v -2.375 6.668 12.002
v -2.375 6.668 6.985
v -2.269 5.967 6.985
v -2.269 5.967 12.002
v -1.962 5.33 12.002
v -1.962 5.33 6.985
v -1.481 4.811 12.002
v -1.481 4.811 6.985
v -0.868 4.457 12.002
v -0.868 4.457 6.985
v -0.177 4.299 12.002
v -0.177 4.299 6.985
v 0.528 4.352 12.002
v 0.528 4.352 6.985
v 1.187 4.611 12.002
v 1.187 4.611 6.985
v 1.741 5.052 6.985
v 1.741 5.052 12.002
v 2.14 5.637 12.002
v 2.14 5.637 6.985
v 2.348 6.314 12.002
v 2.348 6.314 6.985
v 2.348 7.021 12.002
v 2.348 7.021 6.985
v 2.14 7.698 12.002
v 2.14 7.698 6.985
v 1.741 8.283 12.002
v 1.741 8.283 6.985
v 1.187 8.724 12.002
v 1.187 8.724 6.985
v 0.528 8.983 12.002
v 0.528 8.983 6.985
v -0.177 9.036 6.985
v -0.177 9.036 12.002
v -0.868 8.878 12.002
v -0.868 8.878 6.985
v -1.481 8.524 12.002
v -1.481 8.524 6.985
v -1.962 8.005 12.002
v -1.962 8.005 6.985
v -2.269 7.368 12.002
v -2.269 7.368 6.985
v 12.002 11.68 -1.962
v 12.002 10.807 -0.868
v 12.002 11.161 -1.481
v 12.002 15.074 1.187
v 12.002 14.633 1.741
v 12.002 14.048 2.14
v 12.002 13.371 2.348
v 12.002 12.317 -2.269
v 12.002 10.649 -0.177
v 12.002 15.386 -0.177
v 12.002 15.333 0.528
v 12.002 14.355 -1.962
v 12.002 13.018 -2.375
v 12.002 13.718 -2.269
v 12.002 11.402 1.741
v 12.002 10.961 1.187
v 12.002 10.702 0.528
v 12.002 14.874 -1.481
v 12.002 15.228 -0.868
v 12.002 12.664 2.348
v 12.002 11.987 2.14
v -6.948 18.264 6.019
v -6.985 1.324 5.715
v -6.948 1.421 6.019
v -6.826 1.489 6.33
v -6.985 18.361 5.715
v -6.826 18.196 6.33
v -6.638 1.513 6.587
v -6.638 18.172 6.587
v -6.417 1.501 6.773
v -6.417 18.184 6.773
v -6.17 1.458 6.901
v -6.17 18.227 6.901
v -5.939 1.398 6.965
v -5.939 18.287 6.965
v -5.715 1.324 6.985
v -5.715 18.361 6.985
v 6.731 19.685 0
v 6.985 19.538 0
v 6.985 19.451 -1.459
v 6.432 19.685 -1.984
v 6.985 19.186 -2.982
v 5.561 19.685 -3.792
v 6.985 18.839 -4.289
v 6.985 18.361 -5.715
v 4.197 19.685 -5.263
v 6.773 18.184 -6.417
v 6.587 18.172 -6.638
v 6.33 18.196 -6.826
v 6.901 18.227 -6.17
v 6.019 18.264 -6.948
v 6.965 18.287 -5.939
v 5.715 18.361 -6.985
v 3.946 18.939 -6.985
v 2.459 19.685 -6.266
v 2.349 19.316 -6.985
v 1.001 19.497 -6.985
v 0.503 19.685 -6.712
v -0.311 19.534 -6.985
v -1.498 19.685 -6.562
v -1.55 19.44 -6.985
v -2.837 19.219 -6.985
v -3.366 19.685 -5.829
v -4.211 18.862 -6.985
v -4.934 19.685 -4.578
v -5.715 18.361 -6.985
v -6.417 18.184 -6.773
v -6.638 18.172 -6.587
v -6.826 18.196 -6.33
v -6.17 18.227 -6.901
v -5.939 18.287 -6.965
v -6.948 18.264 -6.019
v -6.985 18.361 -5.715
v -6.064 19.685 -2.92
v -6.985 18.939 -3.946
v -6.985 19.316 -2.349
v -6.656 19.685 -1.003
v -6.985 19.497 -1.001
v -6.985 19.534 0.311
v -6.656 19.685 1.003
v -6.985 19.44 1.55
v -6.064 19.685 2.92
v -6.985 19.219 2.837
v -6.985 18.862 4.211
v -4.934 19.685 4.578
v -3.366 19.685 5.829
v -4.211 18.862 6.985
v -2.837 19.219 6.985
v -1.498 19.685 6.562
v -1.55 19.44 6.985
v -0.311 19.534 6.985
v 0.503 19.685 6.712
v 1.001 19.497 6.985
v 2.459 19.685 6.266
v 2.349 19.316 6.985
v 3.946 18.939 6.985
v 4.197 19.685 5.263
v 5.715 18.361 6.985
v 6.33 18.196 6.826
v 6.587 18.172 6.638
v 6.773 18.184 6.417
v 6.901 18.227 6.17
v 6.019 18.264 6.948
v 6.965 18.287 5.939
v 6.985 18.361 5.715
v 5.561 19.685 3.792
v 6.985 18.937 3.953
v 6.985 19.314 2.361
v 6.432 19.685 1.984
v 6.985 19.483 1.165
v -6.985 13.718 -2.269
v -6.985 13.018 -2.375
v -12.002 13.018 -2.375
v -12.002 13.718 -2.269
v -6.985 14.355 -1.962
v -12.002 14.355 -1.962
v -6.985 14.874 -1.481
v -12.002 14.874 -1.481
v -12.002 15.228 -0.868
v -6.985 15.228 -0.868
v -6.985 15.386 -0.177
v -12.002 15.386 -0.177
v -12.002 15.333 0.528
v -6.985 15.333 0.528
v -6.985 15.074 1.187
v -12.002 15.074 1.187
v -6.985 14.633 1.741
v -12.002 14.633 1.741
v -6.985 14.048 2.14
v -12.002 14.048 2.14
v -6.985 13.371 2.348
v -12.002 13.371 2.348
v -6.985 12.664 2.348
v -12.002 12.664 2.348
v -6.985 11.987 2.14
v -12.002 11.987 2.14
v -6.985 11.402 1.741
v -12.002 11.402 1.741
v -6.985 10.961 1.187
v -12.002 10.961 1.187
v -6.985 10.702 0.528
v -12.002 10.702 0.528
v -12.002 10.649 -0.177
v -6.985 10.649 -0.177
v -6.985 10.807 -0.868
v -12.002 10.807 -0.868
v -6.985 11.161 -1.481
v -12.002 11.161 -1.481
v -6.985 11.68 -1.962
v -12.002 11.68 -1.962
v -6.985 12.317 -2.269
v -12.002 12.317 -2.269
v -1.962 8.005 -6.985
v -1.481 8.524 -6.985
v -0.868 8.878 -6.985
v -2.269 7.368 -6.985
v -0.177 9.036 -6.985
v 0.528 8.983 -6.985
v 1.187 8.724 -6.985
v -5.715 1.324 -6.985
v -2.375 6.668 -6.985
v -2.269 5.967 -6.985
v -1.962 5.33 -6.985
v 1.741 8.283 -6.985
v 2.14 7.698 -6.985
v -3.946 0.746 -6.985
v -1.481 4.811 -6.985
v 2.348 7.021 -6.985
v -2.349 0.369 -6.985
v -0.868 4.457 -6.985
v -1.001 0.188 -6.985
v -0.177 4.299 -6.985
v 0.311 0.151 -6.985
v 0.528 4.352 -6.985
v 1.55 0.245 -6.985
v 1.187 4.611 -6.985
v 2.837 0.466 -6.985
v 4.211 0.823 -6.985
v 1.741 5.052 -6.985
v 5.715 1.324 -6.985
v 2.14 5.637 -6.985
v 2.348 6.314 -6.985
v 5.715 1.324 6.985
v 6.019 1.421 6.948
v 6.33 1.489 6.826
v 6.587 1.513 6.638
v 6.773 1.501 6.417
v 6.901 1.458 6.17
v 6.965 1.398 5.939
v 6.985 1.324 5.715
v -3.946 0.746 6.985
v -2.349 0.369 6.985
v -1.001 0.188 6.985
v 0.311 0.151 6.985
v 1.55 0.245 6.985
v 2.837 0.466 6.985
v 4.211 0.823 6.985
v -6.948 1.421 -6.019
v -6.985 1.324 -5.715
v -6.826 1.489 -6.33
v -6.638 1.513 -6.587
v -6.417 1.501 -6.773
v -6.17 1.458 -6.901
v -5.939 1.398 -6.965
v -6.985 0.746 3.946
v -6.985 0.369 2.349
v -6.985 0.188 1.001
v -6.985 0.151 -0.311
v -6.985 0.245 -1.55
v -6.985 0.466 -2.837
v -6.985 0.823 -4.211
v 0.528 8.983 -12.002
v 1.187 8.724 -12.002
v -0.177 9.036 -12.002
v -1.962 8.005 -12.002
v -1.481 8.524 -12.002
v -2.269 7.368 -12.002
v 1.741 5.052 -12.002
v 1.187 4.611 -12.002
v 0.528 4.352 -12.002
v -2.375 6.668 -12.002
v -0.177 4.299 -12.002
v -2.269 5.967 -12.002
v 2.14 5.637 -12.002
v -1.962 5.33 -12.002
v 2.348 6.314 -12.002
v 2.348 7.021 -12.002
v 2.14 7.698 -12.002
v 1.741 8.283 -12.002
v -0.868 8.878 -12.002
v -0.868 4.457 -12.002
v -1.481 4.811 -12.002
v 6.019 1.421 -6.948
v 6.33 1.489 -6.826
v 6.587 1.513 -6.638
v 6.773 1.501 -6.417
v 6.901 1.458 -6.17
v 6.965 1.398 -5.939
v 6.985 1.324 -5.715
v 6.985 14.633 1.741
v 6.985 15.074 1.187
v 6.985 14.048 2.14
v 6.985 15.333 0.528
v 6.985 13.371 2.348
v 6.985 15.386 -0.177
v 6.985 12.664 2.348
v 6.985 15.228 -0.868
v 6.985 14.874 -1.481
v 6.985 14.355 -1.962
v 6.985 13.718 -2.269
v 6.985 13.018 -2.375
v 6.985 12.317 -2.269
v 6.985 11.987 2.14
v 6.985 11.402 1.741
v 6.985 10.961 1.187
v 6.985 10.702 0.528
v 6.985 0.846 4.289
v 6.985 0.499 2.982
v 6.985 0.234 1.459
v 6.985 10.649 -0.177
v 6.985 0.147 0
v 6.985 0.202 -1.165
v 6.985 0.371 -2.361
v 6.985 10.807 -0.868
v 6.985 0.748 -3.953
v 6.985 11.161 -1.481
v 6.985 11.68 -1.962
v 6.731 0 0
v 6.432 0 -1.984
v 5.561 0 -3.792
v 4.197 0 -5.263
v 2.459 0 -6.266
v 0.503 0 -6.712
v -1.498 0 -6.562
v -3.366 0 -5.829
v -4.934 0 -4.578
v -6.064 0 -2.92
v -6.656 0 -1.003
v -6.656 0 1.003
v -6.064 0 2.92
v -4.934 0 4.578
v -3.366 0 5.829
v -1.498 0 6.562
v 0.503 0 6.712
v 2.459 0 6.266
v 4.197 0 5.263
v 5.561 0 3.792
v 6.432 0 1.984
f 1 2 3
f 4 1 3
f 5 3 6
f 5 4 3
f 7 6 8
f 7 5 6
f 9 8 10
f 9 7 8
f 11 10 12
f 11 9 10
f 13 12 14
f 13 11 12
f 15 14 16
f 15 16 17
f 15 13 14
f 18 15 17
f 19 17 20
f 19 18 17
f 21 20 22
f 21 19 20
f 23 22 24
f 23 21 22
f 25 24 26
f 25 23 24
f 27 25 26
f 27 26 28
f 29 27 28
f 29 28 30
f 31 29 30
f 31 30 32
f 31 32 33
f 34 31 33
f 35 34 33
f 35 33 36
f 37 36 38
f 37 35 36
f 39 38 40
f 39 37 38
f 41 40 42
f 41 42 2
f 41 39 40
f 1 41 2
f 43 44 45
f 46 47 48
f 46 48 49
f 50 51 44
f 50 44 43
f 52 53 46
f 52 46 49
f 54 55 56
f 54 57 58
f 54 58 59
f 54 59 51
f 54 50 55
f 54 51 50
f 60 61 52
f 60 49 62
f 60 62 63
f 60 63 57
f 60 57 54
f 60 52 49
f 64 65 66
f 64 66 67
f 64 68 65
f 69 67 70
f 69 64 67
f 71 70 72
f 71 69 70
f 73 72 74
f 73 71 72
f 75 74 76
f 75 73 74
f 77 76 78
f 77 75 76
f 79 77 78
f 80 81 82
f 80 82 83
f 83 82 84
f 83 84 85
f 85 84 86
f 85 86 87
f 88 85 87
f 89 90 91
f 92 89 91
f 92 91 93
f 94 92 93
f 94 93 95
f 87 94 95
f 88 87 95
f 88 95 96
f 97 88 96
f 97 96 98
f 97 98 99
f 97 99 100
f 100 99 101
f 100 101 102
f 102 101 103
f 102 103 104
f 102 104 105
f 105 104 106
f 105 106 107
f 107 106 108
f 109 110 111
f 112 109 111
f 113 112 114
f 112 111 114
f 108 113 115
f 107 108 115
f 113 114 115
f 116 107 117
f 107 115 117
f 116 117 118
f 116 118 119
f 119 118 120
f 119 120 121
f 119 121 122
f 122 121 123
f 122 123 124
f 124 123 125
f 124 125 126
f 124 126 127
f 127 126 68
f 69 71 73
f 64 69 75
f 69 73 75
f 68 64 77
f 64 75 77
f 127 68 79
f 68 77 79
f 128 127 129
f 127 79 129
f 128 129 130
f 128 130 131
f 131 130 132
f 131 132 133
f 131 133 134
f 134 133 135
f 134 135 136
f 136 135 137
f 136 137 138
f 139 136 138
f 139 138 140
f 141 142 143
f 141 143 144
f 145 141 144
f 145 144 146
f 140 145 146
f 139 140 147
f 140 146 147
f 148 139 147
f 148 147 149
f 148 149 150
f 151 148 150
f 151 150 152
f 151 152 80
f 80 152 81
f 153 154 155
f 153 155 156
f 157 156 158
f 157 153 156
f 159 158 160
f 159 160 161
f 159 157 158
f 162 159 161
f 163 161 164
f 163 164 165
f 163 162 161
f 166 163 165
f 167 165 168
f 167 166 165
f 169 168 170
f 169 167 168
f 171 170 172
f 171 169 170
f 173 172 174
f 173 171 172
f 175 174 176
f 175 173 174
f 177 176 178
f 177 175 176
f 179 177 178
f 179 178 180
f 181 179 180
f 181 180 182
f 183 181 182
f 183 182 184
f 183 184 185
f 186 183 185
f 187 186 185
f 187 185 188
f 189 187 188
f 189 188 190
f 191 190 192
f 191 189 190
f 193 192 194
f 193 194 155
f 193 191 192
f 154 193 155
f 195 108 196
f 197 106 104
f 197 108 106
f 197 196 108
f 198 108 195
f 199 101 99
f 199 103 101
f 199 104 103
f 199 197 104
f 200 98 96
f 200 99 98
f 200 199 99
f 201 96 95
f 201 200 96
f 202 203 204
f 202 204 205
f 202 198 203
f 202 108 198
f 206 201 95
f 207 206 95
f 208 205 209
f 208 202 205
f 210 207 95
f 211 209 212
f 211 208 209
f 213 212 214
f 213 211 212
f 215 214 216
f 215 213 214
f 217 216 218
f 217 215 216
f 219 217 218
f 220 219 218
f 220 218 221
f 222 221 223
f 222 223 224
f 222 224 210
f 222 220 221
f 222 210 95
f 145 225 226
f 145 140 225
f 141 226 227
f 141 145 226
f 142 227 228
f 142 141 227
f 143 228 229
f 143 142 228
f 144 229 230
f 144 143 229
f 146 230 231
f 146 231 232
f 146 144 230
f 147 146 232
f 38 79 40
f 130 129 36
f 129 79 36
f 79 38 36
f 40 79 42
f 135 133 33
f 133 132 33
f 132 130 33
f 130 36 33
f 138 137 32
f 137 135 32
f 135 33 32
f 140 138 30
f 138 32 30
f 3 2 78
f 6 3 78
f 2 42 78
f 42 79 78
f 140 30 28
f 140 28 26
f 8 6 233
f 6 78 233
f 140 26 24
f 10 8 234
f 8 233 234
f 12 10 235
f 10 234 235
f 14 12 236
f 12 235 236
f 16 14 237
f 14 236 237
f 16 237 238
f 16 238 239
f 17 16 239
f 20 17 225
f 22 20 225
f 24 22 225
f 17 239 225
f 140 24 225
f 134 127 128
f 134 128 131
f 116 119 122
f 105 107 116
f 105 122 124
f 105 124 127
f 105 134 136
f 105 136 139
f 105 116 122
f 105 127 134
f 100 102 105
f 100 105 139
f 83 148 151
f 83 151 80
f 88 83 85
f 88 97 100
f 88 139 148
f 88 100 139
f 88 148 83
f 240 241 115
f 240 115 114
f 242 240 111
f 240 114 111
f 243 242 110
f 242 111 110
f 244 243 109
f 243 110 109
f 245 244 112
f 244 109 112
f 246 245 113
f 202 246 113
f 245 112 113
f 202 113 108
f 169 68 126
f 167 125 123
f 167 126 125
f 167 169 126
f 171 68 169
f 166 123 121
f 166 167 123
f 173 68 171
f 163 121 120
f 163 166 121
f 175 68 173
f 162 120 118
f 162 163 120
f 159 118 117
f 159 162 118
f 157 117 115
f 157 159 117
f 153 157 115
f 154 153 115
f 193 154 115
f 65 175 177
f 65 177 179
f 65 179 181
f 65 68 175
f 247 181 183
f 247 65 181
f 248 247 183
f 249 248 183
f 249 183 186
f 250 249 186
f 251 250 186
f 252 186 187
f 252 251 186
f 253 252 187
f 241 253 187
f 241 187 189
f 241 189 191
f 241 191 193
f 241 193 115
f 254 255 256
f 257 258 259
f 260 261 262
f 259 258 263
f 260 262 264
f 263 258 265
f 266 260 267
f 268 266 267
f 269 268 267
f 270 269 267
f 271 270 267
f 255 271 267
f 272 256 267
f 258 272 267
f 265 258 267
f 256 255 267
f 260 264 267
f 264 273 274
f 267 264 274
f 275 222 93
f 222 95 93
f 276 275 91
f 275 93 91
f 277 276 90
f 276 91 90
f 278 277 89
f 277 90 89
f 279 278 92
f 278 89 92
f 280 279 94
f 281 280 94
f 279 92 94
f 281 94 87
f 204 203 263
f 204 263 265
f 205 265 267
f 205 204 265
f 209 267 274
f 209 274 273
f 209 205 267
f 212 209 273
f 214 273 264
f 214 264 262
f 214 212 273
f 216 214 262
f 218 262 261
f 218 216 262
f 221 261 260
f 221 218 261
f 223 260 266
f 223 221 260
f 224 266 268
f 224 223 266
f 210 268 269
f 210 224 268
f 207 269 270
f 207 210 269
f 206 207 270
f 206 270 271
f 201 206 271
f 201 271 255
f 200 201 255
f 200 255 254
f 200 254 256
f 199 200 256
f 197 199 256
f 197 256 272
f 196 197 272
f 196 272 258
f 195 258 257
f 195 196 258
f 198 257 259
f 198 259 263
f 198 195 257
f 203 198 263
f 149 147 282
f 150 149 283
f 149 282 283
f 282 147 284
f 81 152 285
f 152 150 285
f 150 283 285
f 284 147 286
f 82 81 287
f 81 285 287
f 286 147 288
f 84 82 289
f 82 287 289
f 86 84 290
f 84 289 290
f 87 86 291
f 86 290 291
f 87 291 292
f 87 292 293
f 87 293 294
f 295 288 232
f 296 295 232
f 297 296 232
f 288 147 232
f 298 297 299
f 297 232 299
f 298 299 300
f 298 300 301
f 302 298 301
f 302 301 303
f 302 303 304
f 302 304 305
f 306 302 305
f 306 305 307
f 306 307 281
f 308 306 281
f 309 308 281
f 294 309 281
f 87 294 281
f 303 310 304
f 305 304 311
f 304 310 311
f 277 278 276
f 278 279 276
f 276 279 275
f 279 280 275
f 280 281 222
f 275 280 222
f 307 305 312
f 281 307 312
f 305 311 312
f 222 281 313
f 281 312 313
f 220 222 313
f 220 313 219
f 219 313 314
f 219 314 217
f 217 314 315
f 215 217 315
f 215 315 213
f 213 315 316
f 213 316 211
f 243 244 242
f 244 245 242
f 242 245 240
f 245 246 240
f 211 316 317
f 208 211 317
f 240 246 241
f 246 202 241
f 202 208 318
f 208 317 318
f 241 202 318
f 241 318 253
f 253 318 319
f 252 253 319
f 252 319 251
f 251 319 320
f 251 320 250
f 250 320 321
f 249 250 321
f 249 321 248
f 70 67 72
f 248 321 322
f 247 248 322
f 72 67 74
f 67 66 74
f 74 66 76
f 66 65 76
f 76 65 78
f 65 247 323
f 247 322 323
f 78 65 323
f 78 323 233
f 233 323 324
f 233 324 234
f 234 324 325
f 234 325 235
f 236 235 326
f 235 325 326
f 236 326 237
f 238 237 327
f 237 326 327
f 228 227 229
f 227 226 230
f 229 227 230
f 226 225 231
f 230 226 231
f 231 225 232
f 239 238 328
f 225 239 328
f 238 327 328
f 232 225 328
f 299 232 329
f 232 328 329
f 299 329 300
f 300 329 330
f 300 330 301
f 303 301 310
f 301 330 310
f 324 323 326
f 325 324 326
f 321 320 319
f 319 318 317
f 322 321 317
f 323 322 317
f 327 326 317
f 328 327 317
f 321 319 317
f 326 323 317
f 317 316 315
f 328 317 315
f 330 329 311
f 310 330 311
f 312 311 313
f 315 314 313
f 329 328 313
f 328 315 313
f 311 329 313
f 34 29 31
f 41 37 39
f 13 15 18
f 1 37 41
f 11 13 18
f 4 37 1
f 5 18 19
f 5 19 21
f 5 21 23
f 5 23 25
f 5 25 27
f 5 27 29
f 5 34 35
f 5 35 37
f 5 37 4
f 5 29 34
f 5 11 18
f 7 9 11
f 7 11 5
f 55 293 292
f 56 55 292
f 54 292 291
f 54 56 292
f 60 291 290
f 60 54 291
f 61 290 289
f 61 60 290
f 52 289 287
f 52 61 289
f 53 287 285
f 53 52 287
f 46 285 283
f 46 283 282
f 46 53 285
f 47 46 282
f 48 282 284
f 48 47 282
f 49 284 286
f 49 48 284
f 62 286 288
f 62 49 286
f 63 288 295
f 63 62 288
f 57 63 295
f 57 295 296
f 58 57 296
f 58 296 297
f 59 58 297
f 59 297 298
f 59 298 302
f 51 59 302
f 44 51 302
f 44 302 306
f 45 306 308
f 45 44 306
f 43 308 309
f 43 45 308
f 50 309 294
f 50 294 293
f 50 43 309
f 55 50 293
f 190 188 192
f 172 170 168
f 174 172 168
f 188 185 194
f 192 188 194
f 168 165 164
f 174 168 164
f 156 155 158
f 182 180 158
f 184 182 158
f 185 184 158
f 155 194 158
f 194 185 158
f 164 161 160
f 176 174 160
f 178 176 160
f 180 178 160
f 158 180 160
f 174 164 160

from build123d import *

# Parameters (mm, degrees)
INTERMEDIATE_BODY_SK_W  = 13.97
INTERMEDIATE_BODY_SK_H  = 13.97
INTERMEDIATE_BODY_DEPTH = 19.685
PIN1_R                  = 2.3749
PIN_EXTRUDE1_DEPTH      = 12.0015
PIN2_R                  = 2.3749
PIN_EXTRUDE2_DEPTH      = 12.0015
FILLET1_R               = 1.27


with BuildPart() as part:
    # Intermediate_Body-Sk → Intermediate_Body (new body)
    with BuildSketch(Plane(origin=(0, 0, 0), x_dir=(1, 0, 0), z_dir=(0, 1, 0))):
        Rectangle(INTERMEDIATE_BODY_SK_W, INTERMEDIATE_BODY_SK_H)
    extrude(amount=INTERMEDIATE_BODY_DEPTH)

    # Rev-CutSk → Cut-Revolve2 (revolve, cut)
    with BuildSketch(Plane.XY, mode=Mode.PRIVATE) as cut_revolve2_sk:
        Polygon((-6.731, 19.685), (-13.081, 16.018825791), (-13.081, 3.666174209), (-6.731, 0), (-15.621, 0), (-15.621, 19.685), align=None)
    revolve(cut_revolve2_sk.sketch.rotate(Axis((0, 0, 0), (0, 1, 0)), 180), axis=Axis((0, 0, 0), (0, 1, 0)), mode=Mode.SUBTRACT)

    # Pin1 → Pin-Extrude1 (add, symmetric)
    with BuildSketch(Plane.XY):
        with Locations(Location((0, 6.6675, 0), (0, 0, 180))):
            Circle(PIN1_R)
    extrude(amount=PIN_EXTRUDE1_DEPTH, both=True)

    # Pin2 → Pin-Extrude2 (add, symmetric)
    with BuildSketch(Plane(origin=(0, 0, 0), x_dir=(0, 0, -1), z_dir=(1, 0, 0))):
        with Locations((0, 13.0175)):
            Circle(PIN2_R)
    extrude(amount=PIN_EXTRUDE2_DEPTH, both=True)

    # Fillet1
    fillet1_edges = [part.edges().sort_by_distance(p)[0] for p in [
        (6.985, 9.8425, -6.985),
        (-6.985, 9.8425, -6.985),
        (-6.985, 9.8425, 6.985),
        (6.985, 9.8425, 6.985),
    ]]
    fillet(fillet1_edges, radius=FILLET1_R)


solid = part.part
